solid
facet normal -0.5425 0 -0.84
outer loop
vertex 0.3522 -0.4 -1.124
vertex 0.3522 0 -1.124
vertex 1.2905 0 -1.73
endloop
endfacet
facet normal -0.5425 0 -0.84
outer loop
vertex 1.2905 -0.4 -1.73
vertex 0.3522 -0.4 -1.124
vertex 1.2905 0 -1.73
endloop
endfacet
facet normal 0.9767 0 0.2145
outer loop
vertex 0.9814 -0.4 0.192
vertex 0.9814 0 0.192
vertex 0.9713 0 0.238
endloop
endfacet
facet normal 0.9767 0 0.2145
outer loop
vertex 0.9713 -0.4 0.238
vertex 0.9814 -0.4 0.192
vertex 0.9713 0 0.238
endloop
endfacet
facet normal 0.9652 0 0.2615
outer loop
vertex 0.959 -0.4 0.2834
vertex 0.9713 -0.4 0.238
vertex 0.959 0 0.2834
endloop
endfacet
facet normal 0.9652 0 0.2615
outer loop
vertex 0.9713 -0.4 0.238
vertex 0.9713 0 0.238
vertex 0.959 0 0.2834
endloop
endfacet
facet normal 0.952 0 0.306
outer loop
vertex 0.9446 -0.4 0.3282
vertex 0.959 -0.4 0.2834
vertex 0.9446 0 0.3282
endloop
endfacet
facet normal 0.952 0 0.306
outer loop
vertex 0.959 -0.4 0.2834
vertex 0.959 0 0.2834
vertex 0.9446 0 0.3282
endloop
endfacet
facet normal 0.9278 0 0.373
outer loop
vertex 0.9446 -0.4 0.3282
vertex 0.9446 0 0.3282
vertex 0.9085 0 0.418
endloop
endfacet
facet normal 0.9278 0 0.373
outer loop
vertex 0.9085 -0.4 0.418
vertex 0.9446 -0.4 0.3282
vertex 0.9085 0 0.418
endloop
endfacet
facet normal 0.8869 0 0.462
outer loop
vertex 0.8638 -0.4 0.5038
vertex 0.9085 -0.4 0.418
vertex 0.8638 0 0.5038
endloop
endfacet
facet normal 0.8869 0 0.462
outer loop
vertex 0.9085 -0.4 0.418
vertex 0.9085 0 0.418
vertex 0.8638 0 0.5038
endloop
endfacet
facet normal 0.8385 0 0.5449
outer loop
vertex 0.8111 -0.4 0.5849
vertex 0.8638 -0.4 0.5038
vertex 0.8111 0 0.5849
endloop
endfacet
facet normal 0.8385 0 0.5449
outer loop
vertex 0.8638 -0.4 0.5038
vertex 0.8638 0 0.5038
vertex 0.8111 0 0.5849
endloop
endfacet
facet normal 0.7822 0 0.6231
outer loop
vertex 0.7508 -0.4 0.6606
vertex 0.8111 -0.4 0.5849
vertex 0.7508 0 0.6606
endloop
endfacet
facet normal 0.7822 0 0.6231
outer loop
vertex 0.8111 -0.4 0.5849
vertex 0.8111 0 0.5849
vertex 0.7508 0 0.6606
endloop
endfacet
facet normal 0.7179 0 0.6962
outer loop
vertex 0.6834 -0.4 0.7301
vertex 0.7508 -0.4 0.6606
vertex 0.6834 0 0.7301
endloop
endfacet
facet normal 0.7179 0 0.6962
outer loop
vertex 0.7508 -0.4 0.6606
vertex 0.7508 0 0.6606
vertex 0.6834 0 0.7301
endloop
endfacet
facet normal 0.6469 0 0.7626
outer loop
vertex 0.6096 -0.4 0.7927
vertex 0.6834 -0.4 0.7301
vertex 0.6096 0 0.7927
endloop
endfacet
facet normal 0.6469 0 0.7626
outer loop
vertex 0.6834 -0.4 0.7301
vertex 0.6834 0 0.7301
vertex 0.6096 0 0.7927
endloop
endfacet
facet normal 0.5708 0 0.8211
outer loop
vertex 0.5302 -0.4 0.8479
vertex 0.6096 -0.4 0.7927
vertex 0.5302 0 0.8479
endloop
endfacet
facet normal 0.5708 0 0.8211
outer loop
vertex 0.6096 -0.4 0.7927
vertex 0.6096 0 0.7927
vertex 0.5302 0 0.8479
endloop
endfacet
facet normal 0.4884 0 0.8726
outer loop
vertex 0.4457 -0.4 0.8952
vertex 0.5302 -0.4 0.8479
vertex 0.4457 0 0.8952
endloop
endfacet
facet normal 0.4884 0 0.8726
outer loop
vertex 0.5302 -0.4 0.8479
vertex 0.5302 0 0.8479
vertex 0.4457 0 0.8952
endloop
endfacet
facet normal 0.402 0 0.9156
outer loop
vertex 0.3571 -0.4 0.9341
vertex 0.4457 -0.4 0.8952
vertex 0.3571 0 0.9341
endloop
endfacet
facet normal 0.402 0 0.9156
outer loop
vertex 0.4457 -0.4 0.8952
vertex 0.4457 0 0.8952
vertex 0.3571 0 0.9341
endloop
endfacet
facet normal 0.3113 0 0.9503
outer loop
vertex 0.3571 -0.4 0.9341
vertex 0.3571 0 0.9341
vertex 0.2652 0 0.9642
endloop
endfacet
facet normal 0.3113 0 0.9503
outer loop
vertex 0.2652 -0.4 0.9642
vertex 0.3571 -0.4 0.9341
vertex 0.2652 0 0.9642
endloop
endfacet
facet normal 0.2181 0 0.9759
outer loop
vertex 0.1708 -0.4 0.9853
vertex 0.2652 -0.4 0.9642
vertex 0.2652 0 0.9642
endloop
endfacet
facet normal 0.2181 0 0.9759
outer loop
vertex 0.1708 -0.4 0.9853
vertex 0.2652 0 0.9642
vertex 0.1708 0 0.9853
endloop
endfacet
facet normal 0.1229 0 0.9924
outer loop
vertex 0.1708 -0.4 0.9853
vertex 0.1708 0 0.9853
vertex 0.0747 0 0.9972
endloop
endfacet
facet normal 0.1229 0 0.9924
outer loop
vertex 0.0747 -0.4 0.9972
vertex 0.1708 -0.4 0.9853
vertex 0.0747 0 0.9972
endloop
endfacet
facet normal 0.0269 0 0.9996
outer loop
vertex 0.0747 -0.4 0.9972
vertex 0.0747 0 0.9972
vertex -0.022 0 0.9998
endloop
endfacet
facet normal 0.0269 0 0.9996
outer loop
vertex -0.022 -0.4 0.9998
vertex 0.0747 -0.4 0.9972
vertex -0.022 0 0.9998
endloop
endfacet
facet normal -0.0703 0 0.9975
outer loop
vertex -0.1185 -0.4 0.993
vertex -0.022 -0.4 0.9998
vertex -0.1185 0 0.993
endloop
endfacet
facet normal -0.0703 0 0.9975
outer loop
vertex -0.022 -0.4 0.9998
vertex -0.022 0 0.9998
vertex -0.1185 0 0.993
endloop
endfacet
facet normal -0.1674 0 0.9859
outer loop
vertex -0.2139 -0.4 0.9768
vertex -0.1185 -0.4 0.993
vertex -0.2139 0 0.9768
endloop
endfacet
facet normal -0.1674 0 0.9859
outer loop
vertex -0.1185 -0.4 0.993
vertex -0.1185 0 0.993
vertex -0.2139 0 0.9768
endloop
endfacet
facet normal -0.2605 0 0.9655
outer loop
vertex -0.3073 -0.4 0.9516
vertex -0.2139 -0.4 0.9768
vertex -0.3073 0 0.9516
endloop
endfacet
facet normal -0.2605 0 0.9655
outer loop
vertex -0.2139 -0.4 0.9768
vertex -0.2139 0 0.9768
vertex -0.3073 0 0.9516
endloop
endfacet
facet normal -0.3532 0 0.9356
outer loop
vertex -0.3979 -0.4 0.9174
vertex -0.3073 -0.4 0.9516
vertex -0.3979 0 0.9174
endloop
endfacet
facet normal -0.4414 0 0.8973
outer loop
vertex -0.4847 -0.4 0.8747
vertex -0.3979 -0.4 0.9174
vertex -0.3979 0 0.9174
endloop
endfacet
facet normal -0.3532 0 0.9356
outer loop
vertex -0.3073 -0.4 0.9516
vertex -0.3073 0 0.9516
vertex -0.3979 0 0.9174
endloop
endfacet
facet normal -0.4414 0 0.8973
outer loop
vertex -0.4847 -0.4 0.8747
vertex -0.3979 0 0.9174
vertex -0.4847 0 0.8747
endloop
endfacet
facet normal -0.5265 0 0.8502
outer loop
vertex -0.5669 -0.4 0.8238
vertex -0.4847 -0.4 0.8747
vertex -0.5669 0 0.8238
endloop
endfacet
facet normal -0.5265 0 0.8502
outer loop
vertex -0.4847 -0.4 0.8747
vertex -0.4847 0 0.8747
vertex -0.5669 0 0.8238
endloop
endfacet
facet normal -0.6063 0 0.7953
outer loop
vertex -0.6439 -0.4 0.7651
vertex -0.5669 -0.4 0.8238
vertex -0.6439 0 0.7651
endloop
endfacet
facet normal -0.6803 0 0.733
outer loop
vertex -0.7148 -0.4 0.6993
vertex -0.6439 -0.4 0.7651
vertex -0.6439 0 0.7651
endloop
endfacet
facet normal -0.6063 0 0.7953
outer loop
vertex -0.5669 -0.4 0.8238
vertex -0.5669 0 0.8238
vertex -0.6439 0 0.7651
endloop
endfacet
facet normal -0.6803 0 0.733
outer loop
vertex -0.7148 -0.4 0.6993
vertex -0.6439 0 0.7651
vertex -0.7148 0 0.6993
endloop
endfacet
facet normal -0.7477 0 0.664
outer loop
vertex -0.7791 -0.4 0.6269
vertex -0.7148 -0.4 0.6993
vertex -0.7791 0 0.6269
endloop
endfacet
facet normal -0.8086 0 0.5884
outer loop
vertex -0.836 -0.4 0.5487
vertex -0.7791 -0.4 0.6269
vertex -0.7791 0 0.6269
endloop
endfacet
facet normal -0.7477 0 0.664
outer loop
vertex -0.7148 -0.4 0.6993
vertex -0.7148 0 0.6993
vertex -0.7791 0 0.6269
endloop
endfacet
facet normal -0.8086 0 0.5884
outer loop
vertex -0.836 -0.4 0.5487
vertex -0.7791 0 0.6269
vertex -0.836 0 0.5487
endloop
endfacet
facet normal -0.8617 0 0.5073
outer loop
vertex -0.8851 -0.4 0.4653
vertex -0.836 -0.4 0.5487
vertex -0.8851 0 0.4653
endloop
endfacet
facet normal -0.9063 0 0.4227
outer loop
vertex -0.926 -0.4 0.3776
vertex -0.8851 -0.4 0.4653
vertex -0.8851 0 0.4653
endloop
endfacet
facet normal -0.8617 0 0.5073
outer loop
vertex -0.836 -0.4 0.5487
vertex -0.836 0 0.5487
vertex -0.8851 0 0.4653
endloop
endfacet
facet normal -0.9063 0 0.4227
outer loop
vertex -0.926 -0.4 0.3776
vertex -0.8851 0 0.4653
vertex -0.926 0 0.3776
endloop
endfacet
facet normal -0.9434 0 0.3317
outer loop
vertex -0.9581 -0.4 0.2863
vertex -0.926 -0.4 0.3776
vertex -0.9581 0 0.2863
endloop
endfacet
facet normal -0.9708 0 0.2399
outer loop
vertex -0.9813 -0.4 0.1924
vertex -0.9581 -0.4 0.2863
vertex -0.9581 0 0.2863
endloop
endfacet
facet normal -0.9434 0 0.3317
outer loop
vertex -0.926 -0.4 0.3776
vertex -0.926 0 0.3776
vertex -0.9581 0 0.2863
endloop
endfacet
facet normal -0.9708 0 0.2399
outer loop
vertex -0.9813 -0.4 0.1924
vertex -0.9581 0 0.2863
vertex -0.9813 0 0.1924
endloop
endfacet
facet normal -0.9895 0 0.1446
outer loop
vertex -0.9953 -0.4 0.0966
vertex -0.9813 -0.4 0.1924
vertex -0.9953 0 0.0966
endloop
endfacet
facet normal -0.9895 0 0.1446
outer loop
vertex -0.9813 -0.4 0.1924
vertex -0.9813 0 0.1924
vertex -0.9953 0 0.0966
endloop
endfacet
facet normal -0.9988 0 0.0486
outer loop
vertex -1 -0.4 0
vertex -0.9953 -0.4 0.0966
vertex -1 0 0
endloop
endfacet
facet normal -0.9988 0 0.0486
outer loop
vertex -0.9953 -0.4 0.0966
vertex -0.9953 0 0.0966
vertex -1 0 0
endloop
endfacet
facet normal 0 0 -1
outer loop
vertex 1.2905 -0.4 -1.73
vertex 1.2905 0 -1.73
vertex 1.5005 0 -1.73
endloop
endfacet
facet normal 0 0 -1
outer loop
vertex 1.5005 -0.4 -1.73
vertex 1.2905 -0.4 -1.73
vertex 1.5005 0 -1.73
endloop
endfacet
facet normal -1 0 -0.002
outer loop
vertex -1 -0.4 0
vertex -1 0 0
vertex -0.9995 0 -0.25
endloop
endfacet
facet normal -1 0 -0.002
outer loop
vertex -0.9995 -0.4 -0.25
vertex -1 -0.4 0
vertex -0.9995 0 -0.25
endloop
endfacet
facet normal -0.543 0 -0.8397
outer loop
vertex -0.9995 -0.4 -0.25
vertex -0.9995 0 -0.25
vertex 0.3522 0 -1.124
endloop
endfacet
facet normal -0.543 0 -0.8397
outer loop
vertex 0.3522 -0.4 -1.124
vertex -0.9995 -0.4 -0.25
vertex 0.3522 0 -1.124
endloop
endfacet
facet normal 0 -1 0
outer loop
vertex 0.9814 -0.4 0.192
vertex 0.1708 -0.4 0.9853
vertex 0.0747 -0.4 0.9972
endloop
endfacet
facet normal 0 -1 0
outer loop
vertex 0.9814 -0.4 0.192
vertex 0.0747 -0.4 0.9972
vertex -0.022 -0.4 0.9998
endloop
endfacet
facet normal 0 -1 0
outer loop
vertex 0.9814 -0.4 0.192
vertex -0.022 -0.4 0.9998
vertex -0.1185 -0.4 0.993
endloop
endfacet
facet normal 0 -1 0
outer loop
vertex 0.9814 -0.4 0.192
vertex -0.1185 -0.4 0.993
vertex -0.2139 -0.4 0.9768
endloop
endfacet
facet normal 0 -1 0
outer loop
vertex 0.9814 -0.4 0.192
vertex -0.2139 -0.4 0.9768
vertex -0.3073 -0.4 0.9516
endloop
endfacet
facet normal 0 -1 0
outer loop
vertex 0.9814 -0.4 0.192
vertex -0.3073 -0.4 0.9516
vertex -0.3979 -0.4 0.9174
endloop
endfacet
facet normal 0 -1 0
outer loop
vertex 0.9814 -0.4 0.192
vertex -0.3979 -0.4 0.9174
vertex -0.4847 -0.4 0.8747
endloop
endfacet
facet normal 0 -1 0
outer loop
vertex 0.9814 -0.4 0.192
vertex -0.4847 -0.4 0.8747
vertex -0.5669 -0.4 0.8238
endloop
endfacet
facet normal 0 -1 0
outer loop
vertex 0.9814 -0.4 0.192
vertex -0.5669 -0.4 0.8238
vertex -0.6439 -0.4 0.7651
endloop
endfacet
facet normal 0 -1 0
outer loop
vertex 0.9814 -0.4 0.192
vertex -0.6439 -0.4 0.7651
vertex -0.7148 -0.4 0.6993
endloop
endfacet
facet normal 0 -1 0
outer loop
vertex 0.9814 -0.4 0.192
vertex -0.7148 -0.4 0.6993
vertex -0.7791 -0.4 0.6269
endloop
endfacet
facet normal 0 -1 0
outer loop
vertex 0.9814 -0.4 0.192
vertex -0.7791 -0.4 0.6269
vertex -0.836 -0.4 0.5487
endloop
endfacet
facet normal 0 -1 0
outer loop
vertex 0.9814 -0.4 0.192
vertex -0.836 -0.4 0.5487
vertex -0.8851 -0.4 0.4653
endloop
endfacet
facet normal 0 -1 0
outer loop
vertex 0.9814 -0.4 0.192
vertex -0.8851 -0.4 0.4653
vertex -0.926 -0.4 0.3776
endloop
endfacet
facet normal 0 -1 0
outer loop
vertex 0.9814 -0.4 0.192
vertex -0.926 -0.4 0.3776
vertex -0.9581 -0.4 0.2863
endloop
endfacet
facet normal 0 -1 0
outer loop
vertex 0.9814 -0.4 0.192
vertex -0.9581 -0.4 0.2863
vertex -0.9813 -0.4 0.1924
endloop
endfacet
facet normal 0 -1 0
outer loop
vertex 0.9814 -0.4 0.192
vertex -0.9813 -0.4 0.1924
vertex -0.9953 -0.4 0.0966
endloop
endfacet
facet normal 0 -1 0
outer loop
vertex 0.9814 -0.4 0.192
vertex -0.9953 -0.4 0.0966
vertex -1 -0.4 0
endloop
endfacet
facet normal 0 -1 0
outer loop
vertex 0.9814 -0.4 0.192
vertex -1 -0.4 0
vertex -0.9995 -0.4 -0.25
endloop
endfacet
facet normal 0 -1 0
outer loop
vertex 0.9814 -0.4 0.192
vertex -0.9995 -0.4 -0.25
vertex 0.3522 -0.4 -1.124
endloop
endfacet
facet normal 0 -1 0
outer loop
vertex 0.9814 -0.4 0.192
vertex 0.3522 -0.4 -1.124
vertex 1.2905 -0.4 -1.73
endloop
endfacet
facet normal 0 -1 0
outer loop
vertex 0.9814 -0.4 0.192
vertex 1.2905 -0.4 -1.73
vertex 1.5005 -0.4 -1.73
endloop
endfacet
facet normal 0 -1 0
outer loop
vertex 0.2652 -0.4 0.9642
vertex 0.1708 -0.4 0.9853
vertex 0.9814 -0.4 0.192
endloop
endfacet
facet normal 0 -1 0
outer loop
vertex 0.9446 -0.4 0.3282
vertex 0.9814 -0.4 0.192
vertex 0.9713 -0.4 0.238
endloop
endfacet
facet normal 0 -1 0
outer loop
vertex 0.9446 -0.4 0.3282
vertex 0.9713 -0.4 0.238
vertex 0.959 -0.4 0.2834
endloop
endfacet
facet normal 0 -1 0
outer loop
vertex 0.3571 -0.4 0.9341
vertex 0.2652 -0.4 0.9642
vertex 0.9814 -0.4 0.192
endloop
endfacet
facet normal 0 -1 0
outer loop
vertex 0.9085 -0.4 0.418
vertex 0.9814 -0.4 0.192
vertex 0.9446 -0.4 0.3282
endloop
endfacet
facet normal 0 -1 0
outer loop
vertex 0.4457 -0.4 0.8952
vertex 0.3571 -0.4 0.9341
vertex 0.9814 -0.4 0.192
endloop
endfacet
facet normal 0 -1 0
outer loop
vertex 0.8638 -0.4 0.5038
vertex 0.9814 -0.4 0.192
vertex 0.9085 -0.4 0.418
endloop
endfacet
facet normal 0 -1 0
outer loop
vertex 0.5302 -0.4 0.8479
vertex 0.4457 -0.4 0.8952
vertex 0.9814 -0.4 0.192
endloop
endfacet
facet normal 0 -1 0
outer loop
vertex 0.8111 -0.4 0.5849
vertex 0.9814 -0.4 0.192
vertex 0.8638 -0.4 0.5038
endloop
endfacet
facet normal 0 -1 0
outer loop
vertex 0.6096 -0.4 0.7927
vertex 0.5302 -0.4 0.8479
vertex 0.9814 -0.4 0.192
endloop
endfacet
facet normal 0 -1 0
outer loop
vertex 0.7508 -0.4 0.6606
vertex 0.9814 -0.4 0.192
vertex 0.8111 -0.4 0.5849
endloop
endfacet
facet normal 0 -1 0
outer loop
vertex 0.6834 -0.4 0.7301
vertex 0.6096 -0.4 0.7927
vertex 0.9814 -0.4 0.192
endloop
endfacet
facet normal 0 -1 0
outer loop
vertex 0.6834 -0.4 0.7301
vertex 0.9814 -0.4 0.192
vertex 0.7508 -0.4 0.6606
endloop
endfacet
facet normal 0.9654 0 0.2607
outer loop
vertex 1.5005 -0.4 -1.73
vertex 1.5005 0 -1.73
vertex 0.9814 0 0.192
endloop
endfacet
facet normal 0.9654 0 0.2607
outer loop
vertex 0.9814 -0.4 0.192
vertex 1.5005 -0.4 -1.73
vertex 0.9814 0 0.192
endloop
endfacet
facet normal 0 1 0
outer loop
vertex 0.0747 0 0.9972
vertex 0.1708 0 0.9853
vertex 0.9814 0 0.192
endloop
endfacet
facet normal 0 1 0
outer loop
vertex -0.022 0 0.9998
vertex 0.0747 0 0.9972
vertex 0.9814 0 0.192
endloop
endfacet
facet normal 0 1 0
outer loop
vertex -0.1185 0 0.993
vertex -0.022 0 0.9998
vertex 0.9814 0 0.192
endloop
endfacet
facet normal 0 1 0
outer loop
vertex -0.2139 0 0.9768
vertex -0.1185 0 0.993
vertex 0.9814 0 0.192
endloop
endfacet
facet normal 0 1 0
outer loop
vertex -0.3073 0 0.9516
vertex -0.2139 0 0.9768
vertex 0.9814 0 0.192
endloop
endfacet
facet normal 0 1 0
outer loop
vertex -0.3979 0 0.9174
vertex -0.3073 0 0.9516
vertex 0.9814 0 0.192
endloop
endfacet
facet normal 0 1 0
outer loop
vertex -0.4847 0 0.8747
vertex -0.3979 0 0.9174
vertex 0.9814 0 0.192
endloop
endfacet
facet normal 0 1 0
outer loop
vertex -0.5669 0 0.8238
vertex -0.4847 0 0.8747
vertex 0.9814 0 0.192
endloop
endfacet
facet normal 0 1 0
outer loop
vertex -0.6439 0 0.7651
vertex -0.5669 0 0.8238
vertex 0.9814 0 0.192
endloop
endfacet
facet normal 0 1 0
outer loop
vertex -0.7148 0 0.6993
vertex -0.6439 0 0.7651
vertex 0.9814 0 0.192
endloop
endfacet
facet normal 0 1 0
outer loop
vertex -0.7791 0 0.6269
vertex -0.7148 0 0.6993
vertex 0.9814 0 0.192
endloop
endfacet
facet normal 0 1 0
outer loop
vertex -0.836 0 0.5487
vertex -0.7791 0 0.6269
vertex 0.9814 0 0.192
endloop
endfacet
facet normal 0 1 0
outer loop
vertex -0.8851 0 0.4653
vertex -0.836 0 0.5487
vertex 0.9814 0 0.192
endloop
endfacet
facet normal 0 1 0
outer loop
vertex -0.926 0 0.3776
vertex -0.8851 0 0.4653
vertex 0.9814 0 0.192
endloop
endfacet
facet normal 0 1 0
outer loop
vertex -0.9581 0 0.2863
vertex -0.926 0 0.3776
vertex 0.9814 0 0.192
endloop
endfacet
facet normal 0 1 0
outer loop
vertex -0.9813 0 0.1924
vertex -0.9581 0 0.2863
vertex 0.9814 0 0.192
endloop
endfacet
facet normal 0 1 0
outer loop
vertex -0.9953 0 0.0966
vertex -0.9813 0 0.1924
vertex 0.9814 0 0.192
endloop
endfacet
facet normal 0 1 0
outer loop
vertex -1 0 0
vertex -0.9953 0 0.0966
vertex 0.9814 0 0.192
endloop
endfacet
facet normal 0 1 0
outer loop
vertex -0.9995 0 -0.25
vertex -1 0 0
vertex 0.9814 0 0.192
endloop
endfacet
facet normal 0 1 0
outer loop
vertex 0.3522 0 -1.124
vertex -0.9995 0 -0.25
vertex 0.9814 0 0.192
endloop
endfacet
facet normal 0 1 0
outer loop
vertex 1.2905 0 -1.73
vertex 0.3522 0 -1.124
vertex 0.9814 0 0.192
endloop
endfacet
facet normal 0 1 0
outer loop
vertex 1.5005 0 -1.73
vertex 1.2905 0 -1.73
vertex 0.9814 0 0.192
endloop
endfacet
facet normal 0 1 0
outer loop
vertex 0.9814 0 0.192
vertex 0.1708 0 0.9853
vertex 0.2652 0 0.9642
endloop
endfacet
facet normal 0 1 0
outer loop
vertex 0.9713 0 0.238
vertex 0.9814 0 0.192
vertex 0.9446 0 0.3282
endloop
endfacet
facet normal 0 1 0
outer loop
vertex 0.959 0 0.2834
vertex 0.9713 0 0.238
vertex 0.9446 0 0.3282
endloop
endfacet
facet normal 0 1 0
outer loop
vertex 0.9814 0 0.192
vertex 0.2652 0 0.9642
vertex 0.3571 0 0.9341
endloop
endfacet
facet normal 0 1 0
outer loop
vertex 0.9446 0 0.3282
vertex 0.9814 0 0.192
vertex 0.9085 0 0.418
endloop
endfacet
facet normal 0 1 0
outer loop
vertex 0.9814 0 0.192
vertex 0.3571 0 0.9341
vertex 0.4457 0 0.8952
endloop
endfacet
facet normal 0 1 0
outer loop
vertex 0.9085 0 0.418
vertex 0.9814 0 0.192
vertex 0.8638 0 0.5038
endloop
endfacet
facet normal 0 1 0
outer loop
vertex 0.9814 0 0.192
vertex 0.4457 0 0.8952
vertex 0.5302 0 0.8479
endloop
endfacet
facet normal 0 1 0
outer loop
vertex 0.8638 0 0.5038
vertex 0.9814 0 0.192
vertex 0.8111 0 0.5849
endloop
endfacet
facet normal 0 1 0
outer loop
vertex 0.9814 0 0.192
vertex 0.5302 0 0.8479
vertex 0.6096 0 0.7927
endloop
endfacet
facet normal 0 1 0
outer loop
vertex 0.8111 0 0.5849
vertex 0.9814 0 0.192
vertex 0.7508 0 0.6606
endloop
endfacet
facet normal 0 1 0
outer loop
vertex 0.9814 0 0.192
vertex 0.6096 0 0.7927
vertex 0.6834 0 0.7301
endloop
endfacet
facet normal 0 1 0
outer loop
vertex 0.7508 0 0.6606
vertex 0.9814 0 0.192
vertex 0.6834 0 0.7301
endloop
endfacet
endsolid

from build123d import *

# Parameters (mm, degrees)
F1_DEPTH = 0.4


# Not quite as in the source:
# - ends of sketch curves that miss each other by under 0.0002 mm in the source are joined


with BuildPart() as f1:
    # F0 (on Front) → F1 (new body)
    with BuildSketch(Plane.XZ):
        with BuildLine():
            ThreePointArc((0.9446077427, 0.3282014815), (-0.166421539, 0.9860547), (-1, 0))
            Line((-1, 0), (-0.9995047651, -0.2500000049))
            Line((-0.9995047651, -0.2500000049), (0.3522404072, -1.1240108766))
            Line((0.3522404072, -1.1240108766), (1.2904977108, -1.73))
            Line((1.2904977108, -1.73), (1.5004977108, -1.73))
            Line((1.5004977108, -1.73), (0.9813866799, 0.1920421425))
            Line((0.9813866799, 0.1920421425), (0.9446077427, 0.3282014815))
        make_face()
        with BuildLine():
            ThreePointArc((0.9813866799, 0.1920421425), (0.9654006787, 0.2607710291), (0.9446077427, 0.3282014815))
            Line((0.9446077427, 0.3282014815), (0.9813866799, 0.1920421425))
        make_face()
    extrude(amount=F1_DEPTH)


solid = f1.part
